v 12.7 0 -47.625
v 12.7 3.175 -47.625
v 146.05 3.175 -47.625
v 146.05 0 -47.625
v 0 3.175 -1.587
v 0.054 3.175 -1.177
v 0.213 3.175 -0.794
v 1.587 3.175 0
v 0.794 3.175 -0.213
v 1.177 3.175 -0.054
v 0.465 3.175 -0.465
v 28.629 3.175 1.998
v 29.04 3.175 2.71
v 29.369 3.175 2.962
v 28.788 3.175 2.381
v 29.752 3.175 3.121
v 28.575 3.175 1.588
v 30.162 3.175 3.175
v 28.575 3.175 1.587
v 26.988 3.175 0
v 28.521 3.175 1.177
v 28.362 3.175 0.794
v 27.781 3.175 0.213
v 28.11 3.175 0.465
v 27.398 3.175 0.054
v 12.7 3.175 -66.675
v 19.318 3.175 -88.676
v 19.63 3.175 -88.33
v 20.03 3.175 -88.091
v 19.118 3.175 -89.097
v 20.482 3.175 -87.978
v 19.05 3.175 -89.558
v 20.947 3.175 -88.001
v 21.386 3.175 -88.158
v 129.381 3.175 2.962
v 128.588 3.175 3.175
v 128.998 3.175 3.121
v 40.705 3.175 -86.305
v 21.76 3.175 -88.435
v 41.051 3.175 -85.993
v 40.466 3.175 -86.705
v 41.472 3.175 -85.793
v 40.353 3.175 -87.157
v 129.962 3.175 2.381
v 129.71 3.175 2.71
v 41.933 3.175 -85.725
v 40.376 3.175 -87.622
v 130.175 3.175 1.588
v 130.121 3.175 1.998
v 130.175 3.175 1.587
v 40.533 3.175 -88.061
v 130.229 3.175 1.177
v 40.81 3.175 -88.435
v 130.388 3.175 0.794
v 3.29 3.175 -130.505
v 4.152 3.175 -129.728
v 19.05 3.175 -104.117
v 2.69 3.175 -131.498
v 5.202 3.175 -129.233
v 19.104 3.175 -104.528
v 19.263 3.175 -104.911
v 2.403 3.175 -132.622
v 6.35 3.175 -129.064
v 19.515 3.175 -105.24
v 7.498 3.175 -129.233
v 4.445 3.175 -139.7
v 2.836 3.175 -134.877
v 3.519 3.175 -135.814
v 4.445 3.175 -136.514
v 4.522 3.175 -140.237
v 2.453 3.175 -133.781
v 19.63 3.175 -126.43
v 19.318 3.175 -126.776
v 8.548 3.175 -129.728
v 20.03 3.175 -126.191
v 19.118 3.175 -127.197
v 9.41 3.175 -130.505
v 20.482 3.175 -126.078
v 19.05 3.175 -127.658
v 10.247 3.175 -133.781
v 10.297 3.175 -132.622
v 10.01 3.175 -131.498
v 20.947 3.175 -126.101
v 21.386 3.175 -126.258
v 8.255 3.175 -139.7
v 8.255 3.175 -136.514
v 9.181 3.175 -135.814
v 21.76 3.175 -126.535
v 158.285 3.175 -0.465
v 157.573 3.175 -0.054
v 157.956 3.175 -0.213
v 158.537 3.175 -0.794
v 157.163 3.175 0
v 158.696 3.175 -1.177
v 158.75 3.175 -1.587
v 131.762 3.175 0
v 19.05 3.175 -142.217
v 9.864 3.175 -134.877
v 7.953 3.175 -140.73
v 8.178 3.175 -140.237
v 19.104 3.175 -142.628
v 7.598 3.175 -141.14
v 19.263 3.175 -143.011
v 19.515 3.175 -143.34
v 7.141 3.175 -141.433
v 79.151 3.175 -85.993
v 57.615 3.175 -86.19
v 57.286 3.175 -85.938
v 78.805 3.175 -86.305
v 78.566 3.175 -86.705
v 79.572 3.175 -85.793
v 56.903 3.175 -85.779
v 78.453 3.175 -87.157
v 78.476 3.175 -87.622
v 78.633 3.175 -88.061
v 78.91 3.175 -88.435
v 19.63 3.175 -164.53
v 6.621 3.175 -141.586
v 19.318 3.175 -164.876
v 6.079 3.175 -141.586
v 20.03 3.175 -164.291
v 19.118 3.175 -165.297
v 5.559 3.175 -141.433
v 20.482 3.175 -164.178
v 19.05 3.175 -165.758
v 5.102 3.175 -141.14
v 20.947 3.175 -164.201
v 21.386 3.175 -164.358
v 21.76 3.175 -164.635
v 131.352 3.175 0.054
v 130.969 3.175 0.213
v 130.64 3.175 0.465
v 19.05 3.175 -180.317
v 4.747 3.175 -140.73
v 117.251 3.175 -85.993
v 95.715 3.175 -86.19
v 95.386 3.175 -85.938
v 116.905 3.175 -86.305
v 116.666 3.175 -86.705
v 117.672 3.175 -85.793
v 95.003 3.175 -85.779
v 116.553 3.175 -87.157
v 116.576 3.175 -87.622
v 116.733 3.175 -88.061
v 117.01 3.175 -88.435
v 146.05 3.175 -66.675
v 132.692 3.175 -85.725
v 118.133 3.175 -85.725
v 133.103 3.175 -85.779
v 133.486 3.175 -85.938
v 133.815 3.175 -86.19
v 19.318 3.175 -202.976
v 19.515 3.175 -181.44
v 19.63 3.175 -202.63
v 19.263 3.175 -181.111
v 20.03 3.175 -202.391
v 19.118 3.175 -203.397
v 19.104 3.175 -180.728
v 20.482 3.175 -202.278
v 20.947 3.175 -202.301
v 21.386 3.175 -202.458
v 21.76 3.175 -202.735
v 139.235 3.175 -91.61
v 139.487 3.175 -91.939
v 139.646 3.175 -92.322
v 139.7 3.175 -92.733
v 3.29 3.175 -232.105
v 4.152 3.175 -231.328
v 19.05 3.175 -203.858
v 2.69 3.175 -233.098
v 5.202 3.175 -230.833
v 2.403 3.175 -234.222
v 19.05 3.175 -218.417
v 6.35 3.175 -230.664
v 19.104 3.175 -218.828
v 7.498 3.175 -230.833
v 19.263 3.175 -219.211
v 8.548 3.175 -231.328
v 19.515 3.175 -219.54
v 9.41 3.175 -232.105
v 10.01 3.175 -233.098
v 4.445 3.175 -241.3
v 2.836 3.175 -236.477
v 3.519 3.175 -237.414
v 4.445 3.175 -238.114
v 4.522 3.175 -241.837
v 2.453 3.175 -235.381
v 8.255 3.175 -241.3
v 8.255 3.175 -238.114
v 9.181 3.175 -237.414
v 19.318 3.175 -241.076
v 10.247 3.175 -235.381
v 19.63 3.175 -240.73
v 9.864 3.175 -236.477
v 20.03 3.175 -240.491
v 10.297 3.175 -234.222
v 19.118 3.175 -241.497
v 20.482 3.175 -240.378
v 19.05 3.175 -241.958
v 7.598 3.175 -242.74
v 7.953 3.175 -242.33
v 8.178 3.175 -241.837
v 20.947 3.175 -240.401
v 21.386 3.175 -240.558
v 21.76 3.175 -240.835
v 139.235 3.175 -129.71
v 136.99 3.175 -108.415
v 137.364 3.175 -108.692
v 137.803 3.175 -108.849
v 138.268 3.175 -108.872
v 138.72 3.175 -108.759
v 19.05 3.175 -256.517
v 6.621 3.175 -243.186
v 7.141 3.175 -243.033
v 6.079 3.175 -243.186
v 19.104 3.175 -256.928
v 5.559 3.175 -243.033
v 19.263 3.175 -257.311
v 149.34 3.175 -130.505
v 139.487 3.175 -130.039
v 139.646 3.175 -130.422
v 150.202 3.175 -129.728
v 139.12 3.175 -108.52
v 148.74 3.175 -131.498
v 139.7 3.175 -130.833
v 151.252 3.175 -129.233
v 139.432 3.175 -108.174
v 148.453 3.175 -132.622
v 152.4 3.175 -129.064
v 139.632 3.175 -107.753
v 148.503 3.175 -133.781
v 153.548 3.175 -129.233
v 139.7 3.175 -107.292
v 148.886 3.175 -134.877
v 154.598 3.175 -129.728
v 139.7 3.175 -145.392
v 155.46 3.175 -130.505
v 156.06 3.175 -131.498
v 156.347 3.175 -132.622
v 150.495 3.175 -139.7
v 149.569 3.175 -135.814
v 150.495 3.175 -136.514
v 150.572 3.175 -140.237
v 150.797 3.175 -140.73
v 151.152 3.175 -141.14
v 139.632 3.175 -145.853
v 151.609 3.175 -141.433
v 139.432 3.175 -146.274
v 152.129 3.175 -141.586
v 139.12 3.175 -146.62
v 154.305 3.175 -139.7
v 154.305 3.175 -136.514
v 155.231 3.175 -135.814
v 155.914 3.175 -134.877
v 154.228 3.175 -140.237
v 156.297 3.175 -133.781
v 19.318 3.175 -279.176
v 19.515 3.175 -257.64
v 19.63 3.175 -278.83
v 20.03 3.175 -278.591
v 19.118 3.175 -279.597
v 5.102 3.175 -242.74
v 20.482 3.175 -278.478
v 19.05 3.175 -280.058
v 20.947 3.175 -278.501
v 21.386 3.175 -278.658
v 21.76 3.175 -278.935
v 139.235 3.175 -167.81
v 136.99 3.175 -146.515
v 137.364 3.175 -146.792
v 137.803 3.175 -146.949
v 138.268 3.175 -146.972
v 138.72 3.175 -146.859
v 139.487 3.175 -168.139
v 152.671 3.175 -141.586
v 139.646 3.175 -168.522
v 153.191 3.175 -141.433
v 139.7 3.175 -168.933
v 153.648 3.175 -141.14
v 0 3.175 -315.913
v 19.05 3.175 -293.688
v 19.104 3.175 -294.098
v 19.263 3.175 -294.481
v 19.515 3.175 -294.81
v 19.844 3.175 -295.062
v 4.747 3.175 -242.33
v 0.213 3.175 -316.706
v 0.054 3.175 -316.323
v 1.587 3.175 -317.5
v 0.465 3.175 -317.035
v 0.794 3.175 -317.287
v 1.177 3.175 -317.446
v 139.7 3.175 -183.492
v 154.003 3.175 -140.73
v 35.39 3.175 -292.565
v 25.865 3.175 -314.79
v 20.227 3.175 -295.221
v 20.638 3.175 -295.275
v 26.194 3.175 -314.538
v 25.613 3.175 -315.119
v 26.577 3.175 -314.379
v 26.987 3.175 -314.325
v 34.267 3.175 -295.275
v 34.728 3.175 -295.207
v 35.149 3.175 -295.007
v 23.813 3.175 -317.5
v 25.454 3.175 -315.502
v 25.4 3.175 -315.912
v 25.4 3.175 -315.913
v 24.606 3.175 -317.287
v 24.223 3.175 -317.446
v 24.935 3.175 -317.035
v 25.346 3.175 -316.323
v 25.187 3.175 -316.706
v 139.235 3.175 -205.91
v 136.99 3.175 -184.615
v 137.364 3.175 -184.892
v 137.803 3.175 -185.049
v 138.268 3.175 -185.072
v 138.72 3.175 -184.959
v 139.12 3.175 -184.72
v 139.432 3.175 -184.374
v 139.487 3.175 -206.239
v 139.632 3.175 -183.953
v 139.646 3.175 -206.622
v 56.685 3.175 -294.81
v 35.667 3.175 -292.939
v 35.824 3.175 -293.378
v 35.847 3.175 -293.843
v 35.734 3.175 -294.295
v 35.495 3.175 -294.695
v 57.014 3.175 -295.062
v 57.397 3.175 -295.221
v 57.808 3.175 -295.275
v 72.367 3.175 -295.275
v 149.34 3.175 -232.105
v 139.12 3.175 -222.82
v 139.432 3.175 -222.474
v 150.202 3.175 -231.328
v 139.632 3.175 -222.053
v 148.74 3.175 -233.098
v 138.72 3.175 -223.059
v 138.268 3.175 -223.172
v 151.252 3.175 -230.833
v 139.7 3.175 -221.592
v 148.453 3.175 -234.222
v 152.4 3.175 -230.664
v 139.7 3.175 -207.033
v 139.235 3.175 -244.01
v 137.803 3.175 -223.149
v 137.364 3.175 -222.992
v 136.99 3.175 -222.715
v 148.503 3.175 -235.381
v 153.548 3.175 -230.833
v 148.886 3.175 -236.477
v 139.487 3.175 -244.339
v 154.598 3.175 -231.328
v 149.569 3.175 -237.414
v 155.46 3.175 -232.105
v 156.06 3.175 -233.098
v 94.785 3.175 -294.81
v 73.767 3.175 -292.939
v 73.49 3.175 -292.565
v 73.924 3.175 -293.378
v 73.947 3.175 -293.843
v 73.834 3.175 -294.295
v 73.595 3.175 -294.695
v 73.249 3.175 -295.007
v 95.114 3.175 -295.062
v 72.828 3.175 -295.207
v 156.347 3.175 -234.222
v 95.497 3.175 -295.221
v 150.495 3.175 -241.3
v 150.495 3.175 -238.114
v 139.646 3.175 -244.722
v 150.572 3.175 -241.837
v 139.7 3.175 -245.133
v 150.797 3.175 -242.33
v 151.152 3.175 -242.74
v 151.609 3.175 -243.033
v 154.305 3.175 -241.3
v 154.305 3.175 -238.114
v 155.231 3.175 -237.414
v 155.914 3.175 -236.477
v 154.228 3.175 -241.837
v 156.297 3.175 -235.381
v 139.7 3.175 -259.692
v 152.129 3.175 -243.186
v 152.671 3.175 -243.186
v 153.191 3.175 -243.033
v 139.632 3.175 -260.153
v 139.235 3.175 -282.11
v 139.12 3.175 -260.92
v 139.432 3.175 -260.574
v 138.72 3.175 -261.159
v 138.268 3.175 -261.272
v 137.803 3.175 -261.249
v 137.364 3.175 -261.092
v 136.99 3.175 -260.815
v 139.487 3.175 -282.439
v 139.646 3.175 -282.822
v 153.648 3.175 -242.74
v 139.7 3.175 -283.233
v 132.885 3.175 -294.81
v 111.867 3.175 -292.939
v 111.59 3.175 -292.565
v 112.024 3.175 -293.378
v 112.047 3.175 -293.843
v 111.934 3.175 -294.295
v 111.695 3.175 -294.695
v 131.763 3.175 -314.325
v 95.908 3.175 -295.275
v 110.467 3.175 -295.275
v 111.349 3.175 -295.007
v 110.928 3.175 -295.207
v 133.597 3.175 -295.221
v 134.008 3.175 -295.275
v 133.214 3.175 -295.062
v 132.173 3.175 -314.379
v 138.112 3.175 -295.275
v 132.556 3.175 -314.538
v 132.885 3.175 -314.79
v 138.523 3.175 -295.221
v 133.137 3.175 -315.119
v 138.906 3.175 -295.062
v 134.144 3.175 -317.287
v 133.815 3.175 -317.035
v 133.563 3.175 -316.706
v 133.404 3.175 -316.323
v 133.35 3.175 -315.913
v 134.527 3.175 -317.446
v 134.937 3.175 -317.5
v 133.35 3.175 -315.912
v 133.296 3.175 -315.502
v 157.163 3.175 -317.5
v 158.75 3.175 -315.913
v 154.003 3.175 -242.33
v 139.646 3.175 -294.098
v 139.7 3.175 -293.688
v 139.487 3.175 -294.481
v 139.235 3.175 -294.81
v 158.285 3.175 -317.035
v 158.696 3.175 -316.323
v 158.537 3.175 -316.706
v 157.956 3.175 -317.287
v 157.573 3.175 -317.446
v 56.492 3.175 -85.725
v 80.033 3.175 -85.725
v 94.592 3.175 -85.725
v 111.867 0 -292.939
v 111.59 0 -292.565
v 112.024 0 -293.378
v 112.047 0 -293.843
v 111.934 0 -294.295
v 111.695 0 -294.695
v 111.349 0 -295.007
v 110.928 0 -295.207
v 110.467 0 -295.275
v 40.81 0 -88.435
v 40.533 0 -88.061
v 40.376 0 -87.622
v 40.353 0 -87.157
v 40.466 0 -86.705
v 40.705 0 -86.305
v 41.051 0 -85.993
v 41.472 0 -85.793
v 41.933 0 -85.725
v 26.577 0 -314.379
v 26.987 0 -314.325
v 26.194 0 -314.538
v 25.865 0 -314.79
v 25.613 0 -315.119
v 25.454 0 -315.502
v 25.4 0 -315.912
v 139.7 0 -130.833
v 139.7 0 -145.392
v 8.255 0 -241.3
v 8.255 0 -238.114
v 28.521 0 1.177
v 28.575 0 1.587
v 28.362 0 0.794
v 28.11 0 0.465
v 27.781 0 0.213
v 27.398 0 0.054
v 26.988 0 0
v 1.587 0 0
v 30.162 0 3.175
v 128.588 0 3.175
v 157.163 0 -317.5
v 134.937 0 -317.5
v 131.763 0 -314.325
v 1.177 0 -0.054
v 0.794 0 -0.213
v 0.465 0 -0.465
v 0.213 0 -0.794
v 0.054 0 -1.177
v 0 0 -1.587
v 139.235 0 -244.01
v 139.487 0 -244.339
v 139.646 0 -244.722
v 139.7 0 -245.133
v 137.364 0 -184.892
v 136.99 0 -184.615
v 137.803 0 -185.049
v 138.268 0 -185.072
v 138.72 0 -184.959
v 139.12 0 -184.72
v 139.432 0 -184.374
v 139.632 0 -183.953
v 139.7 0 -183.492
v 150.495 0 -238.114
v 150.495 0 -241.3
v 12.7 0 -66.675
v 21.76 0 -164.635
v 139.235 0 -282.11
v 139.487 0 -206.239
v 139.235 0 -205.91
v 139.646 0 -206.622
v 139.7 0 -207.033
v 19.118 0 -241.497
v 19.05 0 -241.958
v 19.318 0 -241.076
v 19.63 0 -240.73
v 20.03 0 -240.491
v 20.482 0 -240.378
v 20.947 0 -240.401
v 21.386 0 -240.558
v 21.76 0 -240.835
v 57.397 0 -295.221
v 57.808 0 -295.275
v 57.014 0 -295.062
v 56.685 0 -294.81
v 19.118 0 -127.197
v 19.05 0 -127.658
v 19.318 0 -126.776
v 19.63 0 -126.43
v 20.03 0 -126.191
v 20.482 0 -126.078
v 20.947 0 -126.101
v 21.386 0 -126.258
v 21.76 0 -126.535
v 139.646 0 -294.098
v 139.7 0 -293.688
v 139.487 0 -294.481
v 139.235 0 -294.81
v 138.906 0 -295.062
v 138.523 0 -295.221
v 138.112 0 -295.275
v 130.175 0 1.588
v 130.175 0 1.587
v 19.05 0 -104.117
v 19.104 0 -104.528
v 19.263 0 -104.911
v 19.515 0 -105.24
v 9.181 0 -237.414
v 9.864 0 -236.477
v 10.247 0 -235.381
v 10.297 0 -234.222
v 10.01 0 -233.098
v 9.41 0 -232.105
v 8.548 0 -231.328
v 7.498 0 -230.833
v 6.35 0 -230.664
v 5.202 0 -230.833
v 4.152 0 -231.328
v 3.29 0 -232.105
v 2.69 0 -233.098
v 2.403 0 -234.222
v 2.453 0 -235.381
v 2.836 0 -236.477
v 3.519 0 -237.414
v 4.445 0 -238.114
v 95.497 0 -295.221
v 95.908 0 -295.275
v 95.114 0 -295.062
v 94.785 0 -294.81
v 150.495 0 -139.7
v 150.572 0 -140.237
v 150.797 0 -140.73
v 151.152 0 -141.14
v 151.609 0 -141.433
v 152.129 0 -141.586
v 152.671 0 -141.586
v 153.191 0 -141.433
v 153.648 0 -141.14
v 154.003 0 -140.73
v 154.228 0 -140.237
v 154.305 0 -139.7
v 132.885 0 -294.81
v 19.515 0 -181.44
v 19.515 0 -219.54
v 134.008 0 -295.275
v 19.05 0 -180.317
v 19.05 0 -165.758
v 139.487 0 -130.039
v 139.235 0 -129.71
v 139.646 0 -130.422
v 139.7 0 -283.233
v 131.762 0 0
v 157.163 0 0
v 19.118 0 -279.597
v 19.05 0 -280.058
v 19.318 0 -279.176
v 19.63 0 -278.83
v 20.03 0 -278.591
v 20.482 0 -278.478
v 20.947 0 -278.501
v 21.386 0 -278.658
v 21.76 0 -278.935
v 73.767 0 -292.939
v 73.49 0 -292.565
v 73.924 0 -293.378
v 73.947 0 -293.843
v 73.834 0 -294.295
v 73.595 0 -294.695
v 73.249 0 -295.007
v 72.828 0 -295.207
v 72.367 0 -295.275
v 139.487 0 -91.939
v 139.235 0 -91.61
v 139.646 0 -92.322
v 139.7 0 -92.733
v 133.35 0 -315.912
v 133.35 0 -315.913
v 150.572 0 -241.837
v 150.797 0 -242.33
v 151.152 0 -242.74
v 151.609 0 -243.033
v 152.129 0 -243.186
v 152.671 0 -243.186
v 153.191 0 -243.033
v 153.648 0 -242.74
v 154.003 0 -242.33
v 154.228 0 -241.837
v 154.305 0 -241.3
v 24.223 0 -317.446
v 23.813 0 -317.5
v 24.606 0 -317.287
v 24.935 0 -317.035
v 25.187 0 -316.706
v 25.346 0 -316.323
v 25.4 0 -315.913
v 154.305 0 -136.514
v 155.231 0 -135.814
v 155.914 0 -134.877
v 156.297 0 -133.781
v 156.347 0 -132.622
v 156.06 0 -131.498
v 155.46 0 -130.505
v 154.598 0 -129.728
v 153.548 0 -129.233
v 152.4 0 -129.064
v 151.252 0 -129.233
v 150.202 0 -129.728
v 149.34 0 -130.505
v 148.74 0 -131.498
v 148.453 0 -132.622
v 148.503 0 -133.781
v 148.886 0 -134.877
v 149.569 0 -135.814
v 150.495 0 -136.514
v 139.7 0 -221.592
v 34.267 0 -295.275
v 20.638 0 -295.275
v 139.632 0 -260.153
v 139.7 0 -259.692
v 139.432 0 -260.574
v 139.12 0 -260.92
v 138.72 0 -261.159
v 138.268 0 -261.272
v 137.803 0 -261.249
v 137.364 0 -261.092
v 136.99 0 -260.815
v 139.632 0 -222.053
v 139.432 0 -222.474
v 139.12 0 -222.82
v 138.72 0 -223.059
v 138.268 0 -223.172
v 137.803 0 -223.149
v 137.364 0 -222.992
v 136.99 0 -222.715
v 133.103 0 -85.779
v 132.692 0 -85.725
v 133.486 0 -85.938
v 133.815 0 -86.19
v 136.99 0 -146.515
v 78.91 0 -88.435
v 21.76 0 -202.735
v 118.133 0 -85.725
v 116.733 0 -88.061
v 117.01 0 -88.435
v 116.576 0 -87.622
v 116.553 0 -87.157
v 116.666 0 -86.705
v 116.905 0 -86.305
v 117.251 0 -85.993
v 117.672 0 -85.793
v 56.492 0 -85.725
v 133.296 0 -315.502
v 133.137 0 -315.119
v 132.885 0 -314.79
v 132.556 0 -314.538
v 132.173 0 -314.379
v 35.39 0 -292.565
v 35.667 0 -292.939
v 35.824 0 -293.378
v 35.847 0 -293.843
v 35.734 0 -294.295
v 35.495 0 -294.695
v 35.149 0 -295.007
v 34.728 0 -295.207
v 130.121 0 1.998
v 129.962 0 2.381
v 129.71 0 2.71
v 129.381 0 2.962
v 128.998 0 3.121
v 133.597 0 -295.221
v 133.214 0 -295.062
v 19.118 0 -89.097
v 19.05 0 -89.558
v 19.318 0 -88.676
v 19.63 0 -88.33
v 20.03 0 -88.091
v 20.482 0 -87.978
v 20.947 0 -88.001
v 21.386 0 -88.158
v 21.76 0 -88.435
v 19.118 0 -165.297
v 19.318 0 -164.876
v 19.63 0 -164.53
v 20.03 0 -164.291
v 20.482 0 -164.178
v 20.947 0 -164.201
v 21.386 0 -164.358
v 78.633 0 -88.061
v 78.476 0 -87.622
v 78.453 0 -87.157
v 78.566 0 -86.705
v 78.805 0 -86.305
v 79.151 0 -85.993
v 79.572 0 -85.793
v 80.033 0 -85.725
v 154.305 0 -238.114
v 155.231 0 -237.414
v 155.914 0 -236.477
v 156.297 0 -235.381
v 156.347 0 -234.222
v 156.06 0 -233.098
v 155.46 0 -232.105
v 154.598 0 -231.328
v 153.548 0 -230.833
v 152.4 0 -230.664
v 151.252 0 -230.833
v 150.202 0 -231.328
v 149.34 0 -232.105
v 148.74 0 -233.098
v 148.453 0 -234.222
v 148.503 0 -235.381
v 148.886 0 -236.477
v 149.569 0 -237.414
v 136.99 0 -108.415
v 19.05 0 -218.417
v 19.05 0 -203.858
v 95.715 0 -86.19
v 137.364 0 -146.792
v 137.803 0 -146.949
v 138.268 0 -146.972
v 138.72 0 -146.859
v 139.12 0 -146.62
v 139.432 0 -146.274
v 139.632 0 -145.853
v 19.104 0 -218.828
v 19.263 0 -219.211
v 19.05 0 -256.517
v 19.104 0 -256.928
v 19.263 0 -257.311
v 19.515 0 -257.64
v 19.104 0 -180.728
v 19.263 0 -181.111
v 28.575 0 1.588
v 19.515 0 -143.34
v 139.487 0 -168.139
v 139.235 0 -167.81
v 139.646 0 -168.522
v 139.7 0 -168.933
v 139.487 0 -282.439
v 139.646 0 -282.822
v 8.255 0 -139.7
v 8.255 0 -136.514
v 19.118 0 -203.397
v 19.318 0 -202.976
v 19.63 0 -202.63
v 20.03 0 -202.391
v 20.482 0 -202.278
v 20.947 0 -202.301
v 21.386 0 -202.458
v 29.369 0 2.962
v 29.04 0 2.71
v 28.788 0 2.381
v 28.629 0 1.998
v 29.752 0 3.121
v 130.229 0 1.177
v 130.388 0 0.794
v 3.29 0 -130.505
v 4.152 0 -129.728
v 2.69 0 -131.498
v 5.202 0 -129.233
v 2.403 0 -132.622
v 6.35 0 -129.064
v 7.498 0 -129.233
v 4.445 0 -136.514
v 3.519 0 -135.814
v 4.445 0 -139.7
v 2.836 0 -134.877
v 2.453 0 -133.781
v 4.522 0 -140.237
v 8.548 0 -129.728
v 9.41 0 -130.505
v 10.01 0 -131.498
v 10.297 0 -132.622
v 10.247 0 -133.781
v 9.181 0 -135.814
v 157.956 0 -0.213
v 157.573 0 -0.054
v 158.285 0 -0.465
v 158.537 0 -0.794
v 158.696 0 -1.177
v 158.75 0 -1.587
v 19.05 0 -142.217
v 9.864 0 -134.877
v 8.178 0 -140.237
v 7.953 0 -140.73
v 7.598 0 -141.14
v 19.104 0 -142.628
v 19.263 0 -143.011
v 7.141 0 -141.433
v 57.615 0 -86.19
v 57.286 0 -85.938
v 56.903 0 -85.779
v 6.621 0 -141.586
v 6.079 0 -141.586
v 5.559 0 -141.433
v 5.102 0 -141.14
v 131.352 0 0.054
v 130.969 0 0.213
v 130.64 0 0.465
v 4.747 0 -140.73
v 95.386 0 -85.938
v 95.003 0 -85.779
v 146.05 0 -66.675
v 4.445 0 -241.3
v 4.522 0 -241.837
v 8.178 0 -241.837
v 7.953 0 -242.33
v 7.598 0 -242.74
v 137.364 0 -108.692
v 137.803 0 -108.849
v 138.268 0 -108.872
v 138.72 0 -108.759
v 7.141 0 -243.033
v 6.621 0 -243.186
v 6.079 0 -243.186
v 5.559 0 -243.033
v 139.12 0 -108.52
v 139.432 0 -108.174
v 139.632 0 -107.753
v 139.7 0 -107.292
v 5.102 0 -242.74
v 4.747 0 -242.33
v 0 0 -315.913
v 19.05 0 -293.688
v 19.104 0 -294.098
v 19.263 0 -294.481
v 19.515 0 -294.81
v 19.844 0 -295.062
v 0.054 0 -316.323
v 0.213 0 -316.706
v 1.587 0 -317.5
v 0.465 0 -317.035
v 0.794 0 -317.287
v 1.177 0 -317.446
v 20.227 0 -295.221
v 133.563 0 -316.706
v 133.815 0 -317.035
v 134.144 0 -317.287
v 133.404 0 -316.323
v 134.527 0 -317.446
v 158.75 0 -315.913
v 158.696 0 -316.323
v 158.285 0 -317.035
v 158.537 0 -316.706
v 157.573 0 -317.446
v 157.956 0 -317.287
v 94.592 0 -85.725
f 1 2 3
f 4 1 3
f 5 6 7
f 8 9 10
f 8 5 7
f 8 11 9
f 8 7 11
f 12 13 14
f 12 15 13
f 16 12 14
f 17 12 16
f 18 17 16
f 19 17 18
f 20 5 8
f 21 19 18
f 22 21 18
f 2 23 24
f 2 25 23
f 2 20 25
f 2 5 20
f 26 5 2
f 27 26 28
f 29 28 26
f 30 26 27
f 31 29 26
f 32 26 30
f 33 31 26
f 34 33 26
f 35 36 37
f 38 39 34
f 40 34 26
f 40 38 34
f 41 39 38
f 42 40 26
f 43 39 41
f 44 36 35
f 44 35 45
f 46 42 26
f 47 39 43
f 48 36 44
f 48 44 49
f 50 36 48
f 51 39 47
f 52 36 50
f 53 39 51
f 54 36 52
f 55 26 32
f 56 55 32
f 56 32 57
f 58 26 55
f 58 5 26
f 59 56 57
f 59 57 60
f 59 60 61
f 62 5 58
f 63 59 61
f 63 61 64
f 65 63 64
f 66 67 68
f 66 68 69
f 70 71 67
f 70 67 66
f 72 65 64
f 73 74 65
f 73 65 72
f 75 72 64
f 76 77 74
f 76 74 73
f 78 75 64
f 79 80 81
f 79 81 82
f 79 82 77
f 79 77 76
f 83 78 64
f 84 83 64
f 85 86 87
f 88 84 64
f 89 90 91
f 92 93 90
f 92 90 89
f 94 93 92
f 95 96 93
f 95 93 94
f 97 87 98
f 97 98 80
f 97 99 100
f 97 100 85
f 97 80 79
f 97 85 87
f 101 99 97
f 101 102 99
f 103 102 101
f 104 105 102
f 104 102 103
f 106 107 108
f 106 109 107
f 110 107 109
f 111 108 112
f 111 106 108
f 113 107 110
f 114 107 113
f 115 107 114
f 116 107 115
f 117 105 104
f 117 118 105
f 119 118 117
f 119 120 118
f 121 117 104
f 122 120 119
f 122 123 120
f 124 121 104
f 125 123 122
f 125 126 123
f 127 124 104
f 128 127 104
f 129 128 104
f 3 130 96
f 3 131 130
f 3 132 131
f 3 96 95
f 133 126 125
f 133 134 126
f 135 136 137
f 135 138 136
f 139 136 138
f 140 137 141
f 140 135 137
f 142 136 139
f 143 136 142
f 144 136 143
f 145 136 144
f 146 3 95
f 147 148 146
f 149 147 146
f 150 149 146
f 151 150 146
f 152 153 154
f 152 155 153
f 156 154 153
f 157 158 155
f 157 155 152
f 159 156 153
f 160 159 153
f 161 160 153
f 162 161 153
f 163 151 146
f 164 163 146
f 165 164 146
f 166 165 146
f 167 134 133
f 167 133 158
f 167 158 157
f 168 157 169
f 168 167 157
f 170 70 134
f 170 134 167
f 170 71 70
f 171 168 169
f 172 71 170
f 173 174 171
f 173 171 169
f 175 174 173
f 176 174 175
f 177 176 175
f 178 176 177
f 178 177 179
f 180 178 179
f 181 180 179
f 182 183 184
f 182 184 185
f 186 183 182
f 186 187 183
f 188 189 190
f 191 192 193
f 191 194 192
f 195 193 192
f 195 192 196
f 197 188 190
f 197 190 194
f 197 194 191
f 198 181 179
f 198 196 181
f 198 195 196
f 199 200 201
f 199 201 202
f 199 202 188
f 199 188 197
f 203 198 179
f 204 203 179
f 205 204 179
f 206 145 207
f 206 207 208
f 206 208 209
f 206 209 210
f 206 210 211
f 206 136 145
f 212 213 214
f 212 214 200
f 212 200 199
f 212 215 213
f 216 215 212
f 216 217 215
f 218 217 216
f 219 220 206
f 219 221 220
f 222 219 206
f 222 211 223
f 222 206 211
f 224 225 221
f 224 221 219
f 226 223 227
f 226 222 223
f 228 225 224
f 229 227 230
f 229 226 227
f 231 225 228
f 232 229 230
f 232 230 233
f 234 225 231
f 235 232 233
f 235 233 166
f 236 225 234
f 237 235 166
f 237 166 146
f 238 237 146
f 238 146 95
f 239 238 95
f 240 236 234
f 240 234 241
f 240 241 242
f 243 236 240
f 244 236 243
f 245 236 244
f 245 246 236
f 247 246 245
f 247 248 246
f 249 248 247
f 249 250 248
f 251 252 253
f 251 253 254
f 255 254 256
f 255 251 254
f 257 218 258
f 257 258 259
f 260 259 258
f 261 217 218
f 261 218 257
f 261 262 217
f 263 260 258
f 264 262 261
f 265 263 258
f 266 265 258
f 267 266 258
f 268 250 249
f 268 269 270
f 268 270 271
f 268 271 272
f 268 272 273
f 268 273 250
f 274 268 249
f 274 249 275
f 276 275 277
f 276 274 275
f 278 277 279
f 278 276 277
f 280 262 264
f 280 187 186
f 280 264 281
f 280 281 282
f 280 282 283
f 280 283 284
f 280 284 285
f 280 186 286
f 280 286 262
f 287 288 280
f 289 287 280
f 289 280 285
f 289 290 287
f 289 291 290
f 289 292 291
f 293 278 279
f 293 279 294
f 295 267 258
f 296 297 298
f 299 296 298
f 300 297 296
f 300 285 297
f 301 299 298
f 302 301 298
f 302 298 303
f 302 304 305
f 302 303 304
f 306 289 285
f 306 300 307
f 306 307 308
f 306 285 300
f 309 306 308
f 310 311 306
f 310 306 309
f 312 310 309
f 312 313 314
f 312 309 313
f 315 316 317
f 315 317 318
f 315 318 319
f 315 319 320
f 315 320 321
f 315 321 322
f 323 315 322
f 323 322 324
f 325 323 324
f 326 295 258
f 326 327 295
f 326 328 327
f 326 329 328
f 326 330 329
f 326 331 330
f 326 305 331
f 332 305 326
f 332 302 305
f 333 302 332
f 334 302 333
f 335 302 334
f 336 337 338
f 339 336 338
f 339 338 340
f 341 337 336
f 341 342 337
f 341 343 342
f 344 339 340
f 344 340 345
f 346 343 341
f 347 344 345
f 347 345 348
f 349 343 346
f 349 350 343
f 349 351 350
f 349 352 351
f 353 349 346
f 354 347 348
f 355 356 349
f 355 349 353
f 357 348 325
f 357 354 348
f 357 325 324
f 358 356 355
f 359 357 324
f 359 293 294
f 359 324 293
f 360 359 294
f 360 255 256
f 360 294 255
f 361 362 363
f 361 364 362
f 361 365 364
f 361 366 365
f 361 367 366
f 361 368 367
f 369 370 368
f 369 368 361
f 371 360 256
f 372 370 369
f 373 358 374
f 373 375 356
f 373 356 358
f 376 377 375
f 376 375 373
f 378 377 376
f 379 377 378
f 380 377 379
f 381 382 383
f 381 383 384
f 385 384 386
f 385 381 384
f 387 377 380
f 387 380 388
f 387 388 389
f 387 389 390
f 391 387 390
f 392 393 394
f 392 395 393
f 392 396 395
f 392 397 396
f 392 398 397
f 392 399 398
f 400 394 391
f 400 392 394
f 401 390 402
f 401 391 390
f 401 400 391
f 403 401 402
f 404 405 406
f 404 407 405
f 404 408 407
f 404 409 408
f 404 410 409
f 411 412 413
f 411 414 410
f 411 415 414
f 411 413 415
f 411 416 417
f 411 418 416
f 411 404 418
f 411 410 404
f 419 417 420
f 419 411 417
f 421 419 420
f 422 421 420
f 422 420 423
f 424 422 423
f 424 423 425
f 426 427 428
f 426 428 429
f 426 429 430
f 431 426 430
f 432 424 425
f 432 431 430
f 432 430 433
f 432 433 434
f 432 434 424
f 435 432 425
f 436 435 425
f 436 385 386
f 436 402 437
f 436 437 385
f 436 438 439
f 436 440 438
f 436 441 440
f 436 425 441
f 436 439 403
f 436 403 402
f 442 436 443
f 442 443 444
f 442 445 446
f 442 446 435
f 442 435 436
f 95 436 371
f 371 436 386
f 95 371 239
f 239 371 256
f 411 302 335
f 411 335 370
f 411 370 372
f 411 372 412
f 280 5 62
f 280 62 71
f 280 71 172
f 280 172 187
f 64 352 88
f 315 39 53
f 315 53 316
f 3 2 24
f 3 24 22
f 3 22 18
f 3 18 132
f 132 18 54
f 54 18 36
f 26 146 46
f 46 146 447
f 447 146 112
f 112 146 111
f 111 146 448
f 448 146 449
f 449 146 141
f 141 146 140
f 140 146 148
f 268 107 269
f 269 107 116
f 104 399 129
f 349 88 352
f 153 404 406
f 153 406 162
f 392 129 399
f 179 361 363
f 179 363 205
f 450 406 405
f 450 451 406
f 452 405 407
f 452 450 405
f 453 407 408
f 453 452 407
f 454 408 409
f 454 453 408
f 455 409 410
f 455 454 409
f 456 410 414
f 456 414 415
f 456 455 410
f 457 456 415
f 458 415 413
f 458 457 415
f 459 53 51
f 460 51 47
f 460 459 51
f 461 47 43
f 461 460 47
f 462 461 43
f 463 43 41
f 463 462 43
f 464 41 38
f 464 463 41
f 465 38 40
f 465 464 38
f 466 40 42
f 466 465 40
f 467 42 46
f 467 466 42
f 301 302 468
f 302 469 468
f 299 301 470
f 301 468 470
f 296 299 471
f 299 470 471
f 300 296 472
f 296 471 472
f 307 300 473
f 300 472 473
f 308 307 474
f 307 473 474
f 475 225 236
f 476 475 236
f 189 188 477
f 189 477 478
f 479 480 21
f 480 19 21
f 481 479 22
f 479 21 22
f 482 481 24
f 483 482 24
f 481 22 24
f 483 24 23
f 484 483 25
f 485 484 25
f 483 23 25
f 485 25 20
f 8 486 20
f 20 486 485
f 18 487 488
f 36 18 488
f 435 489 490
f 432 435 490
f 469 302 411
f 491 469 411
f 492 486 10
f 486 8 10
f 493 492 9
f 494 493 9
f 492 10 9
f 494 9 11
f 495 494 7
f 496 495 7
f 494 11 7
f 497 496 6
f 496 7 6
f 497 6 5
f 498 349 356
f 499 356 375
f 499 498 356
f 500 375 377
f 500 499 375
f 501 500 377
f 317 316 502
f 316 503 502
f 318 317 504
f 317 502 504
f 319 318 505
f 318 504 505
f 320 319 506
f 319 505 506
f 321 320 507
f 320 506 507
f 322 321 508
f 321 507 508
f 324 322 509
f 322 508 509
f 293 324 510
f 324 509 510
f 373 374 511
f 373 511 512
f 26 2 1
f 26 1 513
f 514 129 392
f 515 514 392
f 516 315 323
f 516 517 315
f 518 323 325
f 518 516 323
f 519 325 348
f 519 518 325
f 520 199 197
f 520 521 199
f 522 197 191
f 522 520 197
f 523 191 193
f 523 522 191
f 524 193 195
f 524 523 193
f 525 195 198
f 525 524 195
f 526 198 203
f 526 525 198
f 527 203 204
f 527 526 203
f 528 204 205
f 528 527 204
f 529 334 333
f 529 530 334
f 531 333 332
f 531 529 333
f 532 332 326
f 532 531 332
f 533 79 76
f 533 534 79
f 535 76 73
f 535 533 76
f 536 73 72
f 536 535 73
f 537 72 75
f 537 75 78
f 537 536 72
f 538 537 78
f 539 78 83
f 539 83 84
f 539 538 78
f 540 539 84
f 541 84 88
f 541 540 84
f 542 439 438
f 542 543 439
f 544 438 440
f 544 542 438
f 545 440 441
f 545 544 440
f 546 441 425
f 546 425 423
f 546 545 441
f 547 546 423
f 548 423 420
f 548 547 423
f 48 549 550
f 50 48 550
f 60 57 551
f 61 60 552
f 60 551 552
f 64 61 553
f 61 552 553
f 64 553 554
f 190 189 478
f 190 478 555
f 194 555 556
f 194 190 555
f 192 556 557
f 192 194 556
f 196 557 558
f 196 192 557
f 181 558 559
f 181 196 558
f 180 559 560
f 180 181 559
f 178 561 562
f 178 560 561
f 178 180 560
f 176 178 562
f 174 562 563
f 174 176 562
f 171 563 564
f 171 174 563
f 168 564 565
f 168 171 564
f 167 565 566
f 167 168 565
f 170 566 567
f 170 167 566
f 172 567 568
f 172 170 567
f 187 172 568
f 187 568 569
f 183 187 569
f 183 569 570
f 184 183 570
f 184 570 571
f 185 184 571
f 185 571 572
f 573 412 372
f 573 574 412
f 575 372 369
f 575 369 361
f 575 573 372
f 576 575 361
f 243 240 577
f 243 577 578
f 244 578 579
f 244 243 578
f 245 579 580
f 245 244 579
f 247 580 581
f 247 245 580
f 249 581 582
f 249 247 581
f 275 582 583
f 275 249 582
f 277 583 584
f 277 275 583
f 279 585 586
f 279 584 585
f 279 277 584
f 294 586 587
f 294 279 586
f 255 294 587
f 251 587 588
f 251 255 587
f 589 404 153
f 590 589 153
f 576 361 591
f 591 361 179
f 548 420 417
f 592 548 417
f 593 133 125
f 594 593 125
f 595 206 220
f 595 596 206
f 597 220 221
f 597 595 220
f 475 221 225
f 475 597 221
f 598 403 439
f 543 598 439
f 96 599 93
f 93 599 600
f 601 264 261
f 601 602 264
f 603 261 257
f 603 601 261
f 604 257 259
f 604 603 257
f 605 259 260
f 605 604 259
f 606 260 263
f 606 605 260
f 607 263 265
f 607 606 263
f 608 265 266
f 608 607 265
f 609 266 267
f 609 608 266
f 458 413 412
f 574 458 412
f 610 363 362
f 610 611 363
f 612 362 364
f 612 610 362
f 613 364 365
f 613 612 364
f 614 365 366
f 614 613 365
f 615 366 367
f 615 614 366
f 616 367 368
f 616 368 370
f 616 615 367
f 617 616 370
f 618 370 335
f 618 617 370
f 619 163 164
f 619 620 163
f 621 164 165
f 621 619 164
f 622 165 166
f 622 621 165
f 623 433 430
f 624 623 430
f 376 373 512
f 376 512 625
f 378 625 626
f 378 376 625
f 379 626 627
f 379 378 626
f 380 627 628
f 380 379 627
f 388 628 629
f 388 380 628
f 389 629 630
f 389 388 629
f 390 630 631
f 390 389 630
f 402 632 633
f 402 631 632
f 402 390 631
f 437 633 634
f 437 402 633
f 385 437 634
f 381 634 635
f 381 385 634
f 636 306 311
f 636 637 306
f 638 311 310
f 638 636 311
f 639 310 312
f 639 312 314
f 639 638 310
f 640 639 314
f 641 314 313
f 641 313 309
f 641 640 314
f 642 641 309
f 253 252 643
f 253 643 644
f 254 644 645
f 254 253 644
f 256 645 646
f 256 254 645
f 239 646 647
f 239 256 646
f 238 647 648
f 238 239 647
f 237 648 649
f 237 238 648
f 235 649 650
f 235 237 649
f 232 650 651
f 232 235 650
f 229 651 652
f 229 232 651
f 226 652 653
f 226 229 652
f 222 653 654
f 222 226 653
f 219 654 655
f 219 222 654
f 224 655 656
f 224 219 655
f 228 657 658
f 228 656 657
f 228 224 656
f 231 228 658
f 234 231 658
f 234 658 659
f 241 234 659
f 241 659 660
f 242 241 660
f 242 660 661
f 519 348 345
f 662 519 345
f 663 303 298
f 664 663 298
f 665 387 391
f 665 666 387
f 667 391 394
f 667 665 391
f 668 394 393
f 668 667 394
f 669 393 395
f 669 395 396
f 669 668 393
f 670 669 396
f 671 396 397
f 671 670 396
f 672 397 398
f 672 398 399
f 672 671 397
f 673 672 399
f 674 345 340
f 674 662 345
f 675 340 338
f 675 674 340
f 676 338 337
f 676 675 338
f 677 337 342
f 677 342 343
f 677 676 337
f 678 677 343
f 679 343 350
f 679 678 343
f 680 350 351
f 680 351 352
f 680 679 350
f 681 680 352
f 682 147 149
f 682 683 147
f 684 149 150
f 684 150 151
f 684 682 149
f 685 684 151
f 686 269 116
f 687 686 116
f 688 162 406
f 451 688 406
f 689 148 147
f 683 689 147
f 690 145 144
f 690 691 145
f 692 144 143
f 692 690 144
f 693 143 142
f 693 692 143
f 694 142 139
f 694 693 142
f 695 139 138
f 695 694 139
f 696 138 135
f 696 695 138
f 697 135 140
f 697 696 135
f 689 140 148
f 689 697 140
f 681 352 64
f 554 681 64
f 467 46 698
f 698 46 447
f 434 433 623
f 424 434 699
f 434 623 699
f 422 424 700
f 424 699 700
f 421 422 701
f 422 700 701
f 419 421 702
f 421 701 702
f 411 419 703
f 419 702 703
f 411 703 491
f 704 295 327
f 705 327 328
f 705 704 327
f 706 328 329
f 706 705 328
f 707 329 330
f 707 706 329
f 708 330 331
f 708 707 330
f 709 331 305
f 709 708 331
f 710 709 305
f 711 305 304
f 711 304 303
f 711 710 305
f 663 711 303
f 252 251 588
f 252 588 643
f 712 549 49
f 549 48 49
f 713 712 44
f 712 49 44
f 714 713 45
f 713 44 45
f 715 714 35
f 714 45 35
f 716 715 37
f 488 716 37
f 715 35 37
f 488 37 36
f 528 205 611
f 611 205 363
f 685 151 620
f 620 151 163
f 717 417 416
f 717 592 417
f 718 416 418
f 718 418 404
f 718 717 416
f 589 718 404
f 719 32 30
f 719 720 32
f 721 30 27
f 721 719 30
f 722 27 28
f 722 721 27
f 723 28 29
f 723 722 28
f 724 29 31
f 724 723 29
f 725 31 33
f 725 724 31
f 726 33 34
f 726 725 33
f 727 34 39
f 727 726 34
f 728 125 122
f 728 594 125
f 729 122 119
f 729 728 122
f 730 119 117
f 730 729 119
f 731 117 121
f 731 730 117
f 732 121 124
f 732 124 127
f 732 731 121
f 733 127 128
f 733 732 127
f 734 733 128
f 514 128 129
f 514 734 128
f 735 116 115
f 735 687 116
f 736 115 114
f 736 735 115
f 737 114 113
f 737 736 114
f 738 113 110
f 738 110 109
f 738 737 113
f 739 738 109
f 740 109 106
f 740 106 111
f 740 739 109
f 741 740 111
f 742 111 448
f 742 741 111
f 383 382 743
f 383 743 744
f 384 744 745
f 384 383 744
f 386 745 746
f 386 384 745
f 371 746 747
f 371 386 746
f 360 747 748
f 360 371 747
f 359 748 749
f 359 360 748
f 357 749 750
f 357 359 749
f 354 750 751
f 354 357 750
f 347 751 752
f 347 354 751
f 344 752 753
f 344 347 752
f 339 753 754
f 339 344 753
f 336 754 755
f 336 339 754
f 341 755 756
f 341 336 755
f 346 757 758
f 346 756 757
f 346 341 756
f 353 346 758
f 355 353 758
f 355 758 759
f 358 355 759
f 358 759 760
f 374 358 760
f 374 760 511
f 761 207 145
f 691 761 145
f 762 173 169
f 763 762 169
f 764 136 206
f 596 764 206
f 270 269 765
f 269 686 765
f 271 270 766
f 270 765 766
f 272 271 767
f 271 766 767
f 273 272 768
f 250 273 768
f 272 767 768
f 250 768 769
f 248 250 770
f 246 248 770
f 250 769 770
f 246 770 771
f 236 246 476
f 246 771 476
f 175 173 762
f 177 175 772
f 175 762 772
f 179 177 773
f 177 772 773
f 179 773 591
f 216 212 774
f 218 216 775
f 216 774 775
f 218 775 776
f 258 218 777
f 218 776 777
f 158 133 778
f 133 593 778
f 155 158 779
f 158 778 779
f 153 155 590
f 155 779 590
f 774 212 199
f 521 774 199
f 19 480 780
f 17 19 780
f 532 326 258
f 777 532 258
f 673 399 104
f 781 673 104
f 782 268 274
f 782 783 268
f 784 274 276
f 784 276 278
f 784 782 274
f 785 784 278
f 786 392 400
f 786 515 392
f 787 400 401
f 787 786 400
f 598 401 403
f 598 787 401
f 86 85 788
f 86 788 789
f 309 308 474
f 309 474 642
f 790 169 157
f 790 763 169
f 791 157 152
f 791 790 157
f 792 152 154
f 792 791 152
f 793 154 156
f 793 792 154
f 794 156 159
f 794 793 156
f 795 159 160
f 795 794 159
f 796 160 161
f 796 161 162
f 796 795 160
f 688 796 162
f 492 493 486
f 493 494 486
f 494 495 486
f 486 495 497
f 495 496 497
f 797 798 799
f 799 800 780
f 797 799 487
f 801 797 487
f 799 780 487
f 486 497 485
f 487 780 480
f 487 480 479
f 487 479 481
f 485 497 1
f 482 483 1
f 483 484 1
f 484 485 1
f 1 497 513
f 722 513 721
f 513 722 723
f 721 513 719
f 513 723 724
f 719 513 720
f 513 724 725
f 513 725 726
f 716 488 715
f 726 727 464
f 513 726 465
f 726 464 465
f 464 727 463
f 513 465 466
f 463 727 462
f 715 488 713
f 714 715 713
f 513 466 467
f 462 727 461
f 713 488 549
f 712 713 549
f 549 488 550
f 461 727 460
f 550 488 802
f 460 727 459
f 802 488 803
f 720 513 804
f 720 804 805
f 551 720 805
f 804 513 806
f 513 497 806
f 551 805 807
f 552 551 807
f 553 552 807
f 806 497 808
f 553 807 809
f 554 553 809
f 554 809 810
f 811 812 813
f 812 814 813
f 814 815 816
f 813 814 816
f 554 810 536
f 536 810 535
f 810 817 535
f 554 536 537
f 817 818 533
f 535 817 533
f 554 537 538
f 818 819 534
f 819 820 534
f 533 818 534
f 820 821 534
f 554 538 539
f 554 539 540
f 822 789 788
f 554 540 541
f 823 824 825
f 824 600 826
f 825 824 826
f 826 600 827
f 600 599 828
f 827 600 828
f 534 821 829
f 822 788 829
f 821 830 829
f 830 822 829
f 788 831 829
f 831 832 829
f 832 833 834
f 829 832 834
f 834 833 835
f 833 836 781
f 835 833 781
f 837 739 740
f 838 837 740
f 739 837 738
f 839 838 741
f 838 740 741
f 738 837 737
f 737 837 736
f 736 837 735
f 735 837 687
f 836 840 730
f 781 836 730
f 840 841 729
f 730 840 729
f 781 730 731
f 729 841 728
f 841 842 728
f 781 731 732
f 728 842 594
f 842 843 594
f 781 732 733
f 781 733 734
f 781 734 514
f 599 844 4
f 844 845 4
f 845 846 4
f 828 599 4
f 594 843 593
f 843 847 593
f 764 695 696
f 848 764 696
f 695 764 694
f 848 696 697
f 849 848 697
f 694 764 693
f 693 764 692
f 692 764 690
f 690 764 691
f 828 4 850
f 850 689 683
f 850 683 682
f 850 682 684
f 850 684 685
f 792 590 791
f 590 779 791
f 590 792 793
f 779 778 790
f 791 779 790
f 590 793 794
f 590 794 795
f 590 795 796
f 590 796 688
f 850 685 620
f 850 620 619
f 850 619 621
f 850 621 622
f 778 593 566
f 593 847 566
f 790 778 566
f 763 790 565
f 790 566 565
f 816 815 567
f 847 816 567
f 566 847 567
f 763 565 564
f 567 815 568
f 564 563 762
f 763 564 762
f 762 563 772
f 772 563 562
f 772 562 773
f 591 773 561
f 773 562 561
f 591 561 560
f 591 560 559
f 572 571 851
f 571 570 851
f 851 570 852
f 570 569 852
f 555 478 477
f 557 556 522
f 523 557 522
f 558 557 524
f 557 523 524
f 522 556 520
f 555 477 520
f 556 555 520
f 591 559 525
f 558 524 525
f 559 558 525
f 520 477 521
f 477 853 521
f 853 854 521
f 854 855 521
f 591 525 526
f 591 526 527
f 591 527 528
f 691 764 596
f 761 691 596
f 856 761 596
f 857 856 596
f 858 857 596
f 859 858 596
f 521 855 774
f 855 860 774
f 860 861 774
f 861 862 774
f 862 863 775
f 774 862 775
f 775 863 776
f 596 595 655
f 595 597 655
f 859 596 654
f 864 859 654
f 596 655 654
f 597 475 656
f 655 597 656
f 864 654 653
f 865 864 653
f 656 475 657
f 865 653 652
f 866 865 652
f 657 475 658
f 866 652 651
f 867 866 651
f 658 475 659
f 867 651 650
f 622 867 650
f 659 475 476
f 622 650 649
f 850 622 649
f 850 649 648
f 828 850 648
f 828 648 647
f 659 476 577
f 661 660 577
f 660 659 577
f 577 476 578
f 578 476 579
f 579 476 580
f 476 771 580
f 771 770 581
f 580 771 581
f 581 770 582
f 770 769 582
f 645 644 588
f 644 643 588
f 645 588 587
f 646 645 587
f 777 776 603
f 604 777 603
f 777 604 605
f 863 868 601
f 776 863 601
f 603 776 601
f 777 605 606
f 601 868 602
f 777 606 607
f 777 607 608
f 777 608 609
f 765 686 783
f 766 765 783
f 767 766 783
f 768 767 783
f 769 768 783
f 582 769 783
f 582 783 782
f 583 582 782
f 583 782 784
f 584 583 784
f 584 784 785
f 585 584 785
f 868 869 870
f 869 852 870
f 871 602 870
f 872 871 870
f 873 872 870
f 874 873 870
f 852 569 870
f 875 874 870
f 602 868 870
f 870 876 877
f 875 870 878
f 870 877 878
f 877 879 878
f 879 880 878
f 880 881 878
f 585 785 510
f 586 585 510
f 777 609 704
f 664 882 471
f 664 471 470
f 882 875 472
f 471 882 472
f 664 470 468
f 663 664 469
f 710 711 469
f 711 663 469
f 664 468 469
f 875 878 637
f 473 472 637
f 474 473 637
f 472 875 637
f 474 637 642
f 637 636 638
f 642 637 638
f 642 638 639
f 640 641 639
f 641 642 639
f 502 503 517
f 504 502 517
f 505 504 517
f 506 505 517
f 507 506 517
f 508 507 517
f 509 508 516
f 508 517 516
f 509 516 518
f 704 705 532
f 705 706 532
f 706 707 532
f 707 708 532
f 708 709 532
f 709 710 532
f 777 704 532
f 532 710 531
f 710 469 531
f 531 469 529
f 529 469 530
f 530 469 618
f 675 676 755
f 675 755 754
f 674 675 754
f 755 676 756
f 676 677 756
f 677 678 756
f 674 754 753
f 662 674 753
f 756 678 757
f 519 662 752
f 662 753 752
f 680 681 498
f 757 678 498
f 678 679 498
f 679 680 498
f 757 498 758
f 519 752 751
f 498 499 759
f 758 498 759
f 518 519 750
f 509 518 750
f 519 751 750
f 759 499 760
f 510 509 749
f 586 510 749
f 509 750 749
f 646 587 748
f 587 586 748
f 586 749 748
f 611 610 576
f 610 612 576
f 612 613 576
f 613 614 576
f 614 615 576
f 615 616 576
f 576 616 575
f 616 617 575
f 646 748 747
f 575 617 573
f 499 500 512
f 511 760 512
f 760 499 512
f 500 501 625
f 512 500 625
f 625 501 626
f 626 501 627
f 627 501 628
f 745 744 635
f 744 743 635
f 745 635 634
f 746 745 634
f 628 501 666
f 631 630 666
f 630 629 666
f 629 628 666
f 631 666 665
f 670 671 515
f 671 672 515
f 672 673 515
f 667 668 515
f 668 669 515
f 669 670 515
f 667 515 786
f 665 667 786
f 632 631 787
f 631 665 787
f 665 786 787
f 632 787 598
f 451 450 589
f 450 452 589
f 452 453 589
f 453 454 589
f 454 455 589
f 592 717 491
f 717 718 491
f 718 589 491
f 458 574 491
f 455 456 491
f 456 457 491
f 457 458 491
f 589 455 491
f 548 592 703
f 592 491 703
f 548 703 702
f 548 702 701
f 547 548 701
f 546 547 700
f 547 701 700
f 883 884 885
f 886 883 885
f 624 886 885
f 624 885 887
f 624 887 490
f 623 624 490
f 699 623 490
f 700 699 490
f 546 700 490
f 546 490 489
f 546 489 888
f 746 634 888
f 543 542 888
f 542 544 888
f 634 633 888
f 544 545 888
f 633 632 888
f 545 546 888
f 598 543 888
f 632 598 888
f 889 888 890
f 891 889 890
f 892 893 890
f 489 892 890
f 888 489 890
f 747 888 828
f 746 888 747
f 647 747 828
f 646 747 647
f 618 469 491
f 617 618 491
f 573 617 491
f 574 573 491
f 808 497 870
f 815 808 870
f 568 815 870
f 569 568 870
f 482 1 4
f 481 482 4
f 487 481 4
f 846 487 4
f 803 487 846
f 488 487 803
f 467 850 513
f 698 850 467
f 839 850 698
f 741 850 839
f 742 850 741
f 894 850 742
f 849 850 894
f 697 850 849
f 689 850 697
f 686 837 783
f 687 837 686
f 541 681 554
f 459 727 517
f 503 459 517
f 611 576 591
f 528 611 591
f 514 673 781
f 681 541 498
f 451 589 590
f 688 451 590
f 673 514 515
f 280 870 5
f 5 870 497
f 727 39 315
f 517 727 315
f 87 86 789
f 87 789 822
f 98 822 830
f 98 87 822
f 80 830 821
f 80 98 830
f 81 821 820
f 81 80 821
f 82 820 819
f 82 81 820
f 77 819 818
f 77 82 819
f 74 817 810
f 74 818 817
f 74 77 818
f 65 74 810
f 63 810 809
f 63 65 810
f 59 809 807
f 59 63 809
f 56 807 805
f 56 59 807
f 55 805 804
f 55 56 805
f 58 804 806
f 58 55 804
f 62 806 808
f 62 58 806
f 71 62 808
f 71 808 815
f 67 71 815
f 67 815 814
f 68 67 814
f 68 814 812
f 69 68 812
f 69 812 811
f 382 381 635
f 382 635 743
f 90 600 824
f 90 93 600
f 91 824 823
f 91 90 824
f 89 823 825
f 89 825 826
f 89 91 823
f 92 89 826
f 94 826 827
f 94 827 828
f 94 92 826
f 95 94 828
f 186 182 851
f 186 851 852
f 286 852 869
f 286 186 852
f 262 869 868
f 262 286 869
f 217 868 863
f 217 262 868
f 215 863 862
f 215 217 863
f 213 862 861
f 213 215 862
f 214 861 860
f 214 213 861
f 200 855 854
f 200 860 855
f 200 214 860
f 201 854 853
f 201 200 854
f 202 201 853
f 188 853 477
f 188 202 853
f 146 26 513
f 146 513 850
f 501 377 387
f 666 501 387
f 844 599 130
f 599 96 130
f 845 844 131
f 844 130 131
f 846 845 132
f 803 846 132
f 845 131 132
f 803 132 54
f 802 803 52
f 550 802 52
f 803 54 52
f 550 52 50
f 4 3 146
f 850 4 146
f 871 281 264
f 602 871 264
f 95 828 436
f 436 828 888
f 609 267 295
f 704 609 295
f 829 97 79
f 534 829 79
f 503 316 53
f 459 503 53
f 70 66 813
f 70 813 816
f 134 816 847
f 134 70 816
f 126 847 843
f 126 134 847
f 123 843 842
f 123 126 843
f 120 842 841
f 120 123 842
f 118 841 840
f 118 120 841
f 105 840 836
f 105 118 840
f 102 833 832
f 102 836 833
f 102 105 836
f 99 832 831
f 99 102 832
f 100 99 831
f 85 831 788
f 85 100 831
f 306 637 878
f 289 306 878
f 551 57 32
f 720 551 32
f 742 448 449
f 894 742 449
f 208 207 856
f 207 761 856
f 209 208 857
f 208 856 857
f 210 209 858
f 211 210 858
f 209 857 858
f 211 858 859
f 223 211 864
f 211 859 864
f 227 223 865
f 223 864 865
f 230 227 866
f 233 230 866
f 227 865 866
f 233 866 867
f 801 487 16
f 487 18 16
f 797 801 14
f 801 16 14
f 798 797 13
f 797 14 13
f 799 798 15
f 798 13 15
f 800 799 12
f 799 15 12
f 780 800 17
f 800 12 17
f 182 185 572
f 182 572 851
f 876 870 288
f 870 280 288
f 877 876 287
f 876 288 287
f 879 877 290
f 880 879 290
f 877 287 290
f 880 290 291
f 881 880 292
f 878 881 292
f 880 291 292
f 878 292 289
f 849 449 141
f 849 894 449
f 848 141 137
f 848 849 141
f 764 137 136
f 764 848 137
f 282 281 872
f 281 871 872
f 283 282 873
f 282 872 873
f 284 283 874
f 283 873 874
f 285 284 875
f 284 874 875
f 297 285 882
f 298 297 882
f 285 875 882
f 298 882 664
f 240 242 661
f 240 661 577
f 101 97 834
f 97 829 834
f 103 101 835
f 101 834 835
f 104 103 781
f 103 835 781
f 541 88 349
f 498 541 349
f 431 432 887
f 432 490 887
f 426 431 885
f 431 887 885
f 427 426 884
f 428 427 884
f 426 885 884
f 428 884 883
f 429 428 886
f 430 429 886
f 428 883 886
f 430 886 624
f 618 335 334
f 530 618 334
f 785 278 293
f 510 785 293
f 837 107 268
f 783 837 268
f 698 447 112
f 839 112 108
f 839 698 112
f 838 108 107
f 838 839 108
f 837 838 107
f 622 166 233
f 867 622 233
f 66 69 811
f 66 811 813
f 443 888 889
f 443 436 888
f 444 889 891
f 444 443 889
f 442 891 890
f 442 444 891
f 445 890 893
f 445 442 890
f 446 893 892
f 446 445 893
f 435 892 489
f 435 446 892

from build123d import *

# Parameters (mm, degrees)
BOSS_EXTRUDE1_DEPTH  = 3.175
SKETCH2_W            = 107.95
SKETCH2_H            = 3.175
CUT_EXTRUDE1_DEPTH   = 355.989990176
SKETCH3_W            = 133.35
SKETCH3_H            = 19.05
CUT_EXTRUDE2_DEPTH   = 355.989990176
FILLET1_R            = 1.5875
CUT_EXTRUDE3_DEPTH   = 355.989990176
LPATTERN1_COUNT      = 2
LPATTERN1_PITCH      = 101.6
LPATTERN1_COUNT_DIR2 = 2
LPATTERN1_PITCH_DIR2 = 146.05
CUT_EXTRUDE4_DEPTH   = 355.989990176
FILLET2_R            = 1.5875


with BuildPart() as part:
    # Sketch1 → Boss-Extrude1 (new body)
    with BuildSketch(Plane(origin=(0, 0, 0), x_dir=(1, 0, 0), z_dir=(0, 1, 0))):
        Polygon((130.175, 0), (158.75, 0), (158.75, 317.5), (0, 317.5), (0, 0), (28.575, 0), (28.575, -3.175), (130.175, -3.175), align=None)
    extrude(amount=BOSS_EXTRUDE1_DEPTH)

    # Sketch2 → Cut-Extrude1 (cut, through all)
    with BuildSketch(Plane(origin=(0, 3.175, 0), x_dir=(1, 0, 0), z_dir=(0, 1, 0))):
        with Locations((79.375, 315.9125)):
            Rectangle(SKETCH2_W, SKETCH2_H)
    extrude(amount=-CUT_EXTRUDE1_DEPTH, mode=Mode.SUBTRACT)

    # Sketch3 → Cut-Extrude2 (cut, through all)
    with BuildSketch(Plane(origin=(0, 3.175, 0), x_dir=(1, 0, 0), z_dir=(0, 1, 0))):
        with Locations((79.375, 57.15)):
            Rectangle(SKETCH3_W, SKETCH3_H)
    extrude(amount=-CUT_EXTRUDE2_DEPTH, mode=Mode.SUBTRACT)

    # Fillet1
    fillet1_edges = [part.edges().sort_by_distance(p)[0] for p in [
        (25.4, 1.5875, -314.325),
        (25.4, 1.5875, -317.5),
        (0, 1.5875, -317.5),
        (0, 1.5875, 0),
        (28.575, 1.5875, 0),
        (28.575, 1.5875, 3.175),
        (130.175, 1.5875, 3.175),
        (130.175, 1.5875, 0),
        (158.75, 1.5875, 0),
        (158.75, 1.5875, -317.5),
        (133.35, 1.5875, -317.5),
        (133.35, 1.5875, -314.325),
    ]]
    fillet(fillet1_edges, radius=FILLET1_R - 0.0001)  # a hair under: the kernel refuses the full size

    # Sketch4 → Cut-Extrude3 (cut, through all)
    with BuildSketch(Plane(origin=(0, 3.175, 0), x_dir=(1, 0, 0), z_dir=(0, 1, 0))):
        with BuildLine():
            Line((4.445, 238.114159312), (4.445, 241.3))
            ThreePointArc((4.445, 241.3), (6.35, 243.205), (8.255, 241.3))
            Line((8.255, 241.3), (8.255, 238.114159312))
            ThreePointArc((8.255, 238.114159312), (6.35, 230.66375), (4.445, 238.114159312))
        make_face()
    cut_extrude3 = extrude(amount=-CUT_EXTRUDE3_DEPTH, mode=Mode.SUBTRACT)

    # LPattern1: Cut-Extrude3 2 × 2
    with Locations(*[(j * LPATTERN1_PITCH_DIR2, 0, i * LPATTERN1_PITCH) for i in range(LPATTERN1_COUNT) for j in range(LPATTERN1_COUNT_DIR2) if (i, j) != (0, 0)]):
        add(cut_extrude3, mode=Mode.SUBTRACT)

    # Sketch5 → Cut-Extrude4 (cut, through all)
    with BuildSketch(Plane(origin=(0, 3.175, 0), x_dir=(1, 0, 0), z_dir=(0, 1, 0))):
        Polygon((139.7, 111.125), (114.3, 85.725), (133.35, 85.725), (139.7, 92.075), align=None)
        Polygon((139.7, 149.225), (76.2, 85.725), (95.25, 85.725), (139.7, 130.175), align=None)
        Polygon((139.7, 187.325), (38.1, 85.725), (57.15, 85.725), (139.7, 168.275), align=None)
        Polygon((19.05, 104.775), (19.05, 85.725), (139.7, 206.375), (139.7, 225.425), align=None)
        Polygon((19.05, 142.875), (19.05, 123.825), (139.7, 244.475), (139.7, 263.525), align=None)
        Polygon((19.05, 180.975), (19.05, 161.925), (139.7, 282.575), (139.7, 295.275), (133.35, 295.275), align=None)
        Polygon((19.05, 219.075), (19.05, 200.025), (114.3, 295.275), (95.25, 295.275), align=None)
        Polygon((19.05, 257.175), (19.05, 238.125), (76.2, 295.275), (57.15, 295.275), align=None)
        Polygon((19.05, 295.275), (19.05, 276.225), (38.1, 295.275), align=None)
    extrude(amount=-CUT_EXTRUDE4_DEPTH, mode=Mode.SUBTRACT)

    # Fillet2
    fillet2_edges = [part.edges().sort_by_distance(p)[0] for p in [
        (19.05, 1.5875, -104.775),
        (139.7, 1.5875, -225.425),
        (139.7, 1.5875, -206.375),
        (19.05, 1.5875, -85.725),
        (19.05, 1.5875, -142.875),
        (139.7, 1.5875, -263.525),
        (139.7, 1.5875, -244.475),
        (19.05, 1.5875, -123.825),
        (95.25, 1.5875, -85.725),
        (76.2, 1.5875, -85.725),
        (139.7, 1.5875, -149.225),
        (139.7, 1.5875, -130.175),
        (57.15, 1.5875, -85.725),
        (38.1, 1.5875, -85.725),
        (139.7, 1.5875, -187.325),
        (139.7, 1.5875, -168.275),
        (19.05, 1.5875, -257.175),
        (57.15, 1.5875, -295.275),
        (76.2, 1.5875, -295.275),
        (19.05, 1.5875, -238.125),
        (19.05, 1.5875, -276.225),
        (19.05, 1.5875, -295.275),
        (38.1, 1.5875, -295.275),
        (19.05, 1.5875, -180.975),
        (133.35, 1.5875, -295.275),
        (139.7, 1.5875, -295.275),
        (139.7, 1.5875, -282.575),
        (19.05, 1.5875, -161.925),
        (19.05, 1.5875, -219.075),
        (95.25, 1.5875, -295.275),
        (114.3, 1.5875, -295.275),
        (19.05, 1.5875, -200.025),
        (133.35, 1.5875, -85.725),
        (114.3, 1.5875, -85.725),
        (139.7, 1.5875, -111.125),
        (139.7, 1.5875, -92.075),
    ]]
    fillet(fillet2_edges, radius=FILLET2_R)


solid = part.part
